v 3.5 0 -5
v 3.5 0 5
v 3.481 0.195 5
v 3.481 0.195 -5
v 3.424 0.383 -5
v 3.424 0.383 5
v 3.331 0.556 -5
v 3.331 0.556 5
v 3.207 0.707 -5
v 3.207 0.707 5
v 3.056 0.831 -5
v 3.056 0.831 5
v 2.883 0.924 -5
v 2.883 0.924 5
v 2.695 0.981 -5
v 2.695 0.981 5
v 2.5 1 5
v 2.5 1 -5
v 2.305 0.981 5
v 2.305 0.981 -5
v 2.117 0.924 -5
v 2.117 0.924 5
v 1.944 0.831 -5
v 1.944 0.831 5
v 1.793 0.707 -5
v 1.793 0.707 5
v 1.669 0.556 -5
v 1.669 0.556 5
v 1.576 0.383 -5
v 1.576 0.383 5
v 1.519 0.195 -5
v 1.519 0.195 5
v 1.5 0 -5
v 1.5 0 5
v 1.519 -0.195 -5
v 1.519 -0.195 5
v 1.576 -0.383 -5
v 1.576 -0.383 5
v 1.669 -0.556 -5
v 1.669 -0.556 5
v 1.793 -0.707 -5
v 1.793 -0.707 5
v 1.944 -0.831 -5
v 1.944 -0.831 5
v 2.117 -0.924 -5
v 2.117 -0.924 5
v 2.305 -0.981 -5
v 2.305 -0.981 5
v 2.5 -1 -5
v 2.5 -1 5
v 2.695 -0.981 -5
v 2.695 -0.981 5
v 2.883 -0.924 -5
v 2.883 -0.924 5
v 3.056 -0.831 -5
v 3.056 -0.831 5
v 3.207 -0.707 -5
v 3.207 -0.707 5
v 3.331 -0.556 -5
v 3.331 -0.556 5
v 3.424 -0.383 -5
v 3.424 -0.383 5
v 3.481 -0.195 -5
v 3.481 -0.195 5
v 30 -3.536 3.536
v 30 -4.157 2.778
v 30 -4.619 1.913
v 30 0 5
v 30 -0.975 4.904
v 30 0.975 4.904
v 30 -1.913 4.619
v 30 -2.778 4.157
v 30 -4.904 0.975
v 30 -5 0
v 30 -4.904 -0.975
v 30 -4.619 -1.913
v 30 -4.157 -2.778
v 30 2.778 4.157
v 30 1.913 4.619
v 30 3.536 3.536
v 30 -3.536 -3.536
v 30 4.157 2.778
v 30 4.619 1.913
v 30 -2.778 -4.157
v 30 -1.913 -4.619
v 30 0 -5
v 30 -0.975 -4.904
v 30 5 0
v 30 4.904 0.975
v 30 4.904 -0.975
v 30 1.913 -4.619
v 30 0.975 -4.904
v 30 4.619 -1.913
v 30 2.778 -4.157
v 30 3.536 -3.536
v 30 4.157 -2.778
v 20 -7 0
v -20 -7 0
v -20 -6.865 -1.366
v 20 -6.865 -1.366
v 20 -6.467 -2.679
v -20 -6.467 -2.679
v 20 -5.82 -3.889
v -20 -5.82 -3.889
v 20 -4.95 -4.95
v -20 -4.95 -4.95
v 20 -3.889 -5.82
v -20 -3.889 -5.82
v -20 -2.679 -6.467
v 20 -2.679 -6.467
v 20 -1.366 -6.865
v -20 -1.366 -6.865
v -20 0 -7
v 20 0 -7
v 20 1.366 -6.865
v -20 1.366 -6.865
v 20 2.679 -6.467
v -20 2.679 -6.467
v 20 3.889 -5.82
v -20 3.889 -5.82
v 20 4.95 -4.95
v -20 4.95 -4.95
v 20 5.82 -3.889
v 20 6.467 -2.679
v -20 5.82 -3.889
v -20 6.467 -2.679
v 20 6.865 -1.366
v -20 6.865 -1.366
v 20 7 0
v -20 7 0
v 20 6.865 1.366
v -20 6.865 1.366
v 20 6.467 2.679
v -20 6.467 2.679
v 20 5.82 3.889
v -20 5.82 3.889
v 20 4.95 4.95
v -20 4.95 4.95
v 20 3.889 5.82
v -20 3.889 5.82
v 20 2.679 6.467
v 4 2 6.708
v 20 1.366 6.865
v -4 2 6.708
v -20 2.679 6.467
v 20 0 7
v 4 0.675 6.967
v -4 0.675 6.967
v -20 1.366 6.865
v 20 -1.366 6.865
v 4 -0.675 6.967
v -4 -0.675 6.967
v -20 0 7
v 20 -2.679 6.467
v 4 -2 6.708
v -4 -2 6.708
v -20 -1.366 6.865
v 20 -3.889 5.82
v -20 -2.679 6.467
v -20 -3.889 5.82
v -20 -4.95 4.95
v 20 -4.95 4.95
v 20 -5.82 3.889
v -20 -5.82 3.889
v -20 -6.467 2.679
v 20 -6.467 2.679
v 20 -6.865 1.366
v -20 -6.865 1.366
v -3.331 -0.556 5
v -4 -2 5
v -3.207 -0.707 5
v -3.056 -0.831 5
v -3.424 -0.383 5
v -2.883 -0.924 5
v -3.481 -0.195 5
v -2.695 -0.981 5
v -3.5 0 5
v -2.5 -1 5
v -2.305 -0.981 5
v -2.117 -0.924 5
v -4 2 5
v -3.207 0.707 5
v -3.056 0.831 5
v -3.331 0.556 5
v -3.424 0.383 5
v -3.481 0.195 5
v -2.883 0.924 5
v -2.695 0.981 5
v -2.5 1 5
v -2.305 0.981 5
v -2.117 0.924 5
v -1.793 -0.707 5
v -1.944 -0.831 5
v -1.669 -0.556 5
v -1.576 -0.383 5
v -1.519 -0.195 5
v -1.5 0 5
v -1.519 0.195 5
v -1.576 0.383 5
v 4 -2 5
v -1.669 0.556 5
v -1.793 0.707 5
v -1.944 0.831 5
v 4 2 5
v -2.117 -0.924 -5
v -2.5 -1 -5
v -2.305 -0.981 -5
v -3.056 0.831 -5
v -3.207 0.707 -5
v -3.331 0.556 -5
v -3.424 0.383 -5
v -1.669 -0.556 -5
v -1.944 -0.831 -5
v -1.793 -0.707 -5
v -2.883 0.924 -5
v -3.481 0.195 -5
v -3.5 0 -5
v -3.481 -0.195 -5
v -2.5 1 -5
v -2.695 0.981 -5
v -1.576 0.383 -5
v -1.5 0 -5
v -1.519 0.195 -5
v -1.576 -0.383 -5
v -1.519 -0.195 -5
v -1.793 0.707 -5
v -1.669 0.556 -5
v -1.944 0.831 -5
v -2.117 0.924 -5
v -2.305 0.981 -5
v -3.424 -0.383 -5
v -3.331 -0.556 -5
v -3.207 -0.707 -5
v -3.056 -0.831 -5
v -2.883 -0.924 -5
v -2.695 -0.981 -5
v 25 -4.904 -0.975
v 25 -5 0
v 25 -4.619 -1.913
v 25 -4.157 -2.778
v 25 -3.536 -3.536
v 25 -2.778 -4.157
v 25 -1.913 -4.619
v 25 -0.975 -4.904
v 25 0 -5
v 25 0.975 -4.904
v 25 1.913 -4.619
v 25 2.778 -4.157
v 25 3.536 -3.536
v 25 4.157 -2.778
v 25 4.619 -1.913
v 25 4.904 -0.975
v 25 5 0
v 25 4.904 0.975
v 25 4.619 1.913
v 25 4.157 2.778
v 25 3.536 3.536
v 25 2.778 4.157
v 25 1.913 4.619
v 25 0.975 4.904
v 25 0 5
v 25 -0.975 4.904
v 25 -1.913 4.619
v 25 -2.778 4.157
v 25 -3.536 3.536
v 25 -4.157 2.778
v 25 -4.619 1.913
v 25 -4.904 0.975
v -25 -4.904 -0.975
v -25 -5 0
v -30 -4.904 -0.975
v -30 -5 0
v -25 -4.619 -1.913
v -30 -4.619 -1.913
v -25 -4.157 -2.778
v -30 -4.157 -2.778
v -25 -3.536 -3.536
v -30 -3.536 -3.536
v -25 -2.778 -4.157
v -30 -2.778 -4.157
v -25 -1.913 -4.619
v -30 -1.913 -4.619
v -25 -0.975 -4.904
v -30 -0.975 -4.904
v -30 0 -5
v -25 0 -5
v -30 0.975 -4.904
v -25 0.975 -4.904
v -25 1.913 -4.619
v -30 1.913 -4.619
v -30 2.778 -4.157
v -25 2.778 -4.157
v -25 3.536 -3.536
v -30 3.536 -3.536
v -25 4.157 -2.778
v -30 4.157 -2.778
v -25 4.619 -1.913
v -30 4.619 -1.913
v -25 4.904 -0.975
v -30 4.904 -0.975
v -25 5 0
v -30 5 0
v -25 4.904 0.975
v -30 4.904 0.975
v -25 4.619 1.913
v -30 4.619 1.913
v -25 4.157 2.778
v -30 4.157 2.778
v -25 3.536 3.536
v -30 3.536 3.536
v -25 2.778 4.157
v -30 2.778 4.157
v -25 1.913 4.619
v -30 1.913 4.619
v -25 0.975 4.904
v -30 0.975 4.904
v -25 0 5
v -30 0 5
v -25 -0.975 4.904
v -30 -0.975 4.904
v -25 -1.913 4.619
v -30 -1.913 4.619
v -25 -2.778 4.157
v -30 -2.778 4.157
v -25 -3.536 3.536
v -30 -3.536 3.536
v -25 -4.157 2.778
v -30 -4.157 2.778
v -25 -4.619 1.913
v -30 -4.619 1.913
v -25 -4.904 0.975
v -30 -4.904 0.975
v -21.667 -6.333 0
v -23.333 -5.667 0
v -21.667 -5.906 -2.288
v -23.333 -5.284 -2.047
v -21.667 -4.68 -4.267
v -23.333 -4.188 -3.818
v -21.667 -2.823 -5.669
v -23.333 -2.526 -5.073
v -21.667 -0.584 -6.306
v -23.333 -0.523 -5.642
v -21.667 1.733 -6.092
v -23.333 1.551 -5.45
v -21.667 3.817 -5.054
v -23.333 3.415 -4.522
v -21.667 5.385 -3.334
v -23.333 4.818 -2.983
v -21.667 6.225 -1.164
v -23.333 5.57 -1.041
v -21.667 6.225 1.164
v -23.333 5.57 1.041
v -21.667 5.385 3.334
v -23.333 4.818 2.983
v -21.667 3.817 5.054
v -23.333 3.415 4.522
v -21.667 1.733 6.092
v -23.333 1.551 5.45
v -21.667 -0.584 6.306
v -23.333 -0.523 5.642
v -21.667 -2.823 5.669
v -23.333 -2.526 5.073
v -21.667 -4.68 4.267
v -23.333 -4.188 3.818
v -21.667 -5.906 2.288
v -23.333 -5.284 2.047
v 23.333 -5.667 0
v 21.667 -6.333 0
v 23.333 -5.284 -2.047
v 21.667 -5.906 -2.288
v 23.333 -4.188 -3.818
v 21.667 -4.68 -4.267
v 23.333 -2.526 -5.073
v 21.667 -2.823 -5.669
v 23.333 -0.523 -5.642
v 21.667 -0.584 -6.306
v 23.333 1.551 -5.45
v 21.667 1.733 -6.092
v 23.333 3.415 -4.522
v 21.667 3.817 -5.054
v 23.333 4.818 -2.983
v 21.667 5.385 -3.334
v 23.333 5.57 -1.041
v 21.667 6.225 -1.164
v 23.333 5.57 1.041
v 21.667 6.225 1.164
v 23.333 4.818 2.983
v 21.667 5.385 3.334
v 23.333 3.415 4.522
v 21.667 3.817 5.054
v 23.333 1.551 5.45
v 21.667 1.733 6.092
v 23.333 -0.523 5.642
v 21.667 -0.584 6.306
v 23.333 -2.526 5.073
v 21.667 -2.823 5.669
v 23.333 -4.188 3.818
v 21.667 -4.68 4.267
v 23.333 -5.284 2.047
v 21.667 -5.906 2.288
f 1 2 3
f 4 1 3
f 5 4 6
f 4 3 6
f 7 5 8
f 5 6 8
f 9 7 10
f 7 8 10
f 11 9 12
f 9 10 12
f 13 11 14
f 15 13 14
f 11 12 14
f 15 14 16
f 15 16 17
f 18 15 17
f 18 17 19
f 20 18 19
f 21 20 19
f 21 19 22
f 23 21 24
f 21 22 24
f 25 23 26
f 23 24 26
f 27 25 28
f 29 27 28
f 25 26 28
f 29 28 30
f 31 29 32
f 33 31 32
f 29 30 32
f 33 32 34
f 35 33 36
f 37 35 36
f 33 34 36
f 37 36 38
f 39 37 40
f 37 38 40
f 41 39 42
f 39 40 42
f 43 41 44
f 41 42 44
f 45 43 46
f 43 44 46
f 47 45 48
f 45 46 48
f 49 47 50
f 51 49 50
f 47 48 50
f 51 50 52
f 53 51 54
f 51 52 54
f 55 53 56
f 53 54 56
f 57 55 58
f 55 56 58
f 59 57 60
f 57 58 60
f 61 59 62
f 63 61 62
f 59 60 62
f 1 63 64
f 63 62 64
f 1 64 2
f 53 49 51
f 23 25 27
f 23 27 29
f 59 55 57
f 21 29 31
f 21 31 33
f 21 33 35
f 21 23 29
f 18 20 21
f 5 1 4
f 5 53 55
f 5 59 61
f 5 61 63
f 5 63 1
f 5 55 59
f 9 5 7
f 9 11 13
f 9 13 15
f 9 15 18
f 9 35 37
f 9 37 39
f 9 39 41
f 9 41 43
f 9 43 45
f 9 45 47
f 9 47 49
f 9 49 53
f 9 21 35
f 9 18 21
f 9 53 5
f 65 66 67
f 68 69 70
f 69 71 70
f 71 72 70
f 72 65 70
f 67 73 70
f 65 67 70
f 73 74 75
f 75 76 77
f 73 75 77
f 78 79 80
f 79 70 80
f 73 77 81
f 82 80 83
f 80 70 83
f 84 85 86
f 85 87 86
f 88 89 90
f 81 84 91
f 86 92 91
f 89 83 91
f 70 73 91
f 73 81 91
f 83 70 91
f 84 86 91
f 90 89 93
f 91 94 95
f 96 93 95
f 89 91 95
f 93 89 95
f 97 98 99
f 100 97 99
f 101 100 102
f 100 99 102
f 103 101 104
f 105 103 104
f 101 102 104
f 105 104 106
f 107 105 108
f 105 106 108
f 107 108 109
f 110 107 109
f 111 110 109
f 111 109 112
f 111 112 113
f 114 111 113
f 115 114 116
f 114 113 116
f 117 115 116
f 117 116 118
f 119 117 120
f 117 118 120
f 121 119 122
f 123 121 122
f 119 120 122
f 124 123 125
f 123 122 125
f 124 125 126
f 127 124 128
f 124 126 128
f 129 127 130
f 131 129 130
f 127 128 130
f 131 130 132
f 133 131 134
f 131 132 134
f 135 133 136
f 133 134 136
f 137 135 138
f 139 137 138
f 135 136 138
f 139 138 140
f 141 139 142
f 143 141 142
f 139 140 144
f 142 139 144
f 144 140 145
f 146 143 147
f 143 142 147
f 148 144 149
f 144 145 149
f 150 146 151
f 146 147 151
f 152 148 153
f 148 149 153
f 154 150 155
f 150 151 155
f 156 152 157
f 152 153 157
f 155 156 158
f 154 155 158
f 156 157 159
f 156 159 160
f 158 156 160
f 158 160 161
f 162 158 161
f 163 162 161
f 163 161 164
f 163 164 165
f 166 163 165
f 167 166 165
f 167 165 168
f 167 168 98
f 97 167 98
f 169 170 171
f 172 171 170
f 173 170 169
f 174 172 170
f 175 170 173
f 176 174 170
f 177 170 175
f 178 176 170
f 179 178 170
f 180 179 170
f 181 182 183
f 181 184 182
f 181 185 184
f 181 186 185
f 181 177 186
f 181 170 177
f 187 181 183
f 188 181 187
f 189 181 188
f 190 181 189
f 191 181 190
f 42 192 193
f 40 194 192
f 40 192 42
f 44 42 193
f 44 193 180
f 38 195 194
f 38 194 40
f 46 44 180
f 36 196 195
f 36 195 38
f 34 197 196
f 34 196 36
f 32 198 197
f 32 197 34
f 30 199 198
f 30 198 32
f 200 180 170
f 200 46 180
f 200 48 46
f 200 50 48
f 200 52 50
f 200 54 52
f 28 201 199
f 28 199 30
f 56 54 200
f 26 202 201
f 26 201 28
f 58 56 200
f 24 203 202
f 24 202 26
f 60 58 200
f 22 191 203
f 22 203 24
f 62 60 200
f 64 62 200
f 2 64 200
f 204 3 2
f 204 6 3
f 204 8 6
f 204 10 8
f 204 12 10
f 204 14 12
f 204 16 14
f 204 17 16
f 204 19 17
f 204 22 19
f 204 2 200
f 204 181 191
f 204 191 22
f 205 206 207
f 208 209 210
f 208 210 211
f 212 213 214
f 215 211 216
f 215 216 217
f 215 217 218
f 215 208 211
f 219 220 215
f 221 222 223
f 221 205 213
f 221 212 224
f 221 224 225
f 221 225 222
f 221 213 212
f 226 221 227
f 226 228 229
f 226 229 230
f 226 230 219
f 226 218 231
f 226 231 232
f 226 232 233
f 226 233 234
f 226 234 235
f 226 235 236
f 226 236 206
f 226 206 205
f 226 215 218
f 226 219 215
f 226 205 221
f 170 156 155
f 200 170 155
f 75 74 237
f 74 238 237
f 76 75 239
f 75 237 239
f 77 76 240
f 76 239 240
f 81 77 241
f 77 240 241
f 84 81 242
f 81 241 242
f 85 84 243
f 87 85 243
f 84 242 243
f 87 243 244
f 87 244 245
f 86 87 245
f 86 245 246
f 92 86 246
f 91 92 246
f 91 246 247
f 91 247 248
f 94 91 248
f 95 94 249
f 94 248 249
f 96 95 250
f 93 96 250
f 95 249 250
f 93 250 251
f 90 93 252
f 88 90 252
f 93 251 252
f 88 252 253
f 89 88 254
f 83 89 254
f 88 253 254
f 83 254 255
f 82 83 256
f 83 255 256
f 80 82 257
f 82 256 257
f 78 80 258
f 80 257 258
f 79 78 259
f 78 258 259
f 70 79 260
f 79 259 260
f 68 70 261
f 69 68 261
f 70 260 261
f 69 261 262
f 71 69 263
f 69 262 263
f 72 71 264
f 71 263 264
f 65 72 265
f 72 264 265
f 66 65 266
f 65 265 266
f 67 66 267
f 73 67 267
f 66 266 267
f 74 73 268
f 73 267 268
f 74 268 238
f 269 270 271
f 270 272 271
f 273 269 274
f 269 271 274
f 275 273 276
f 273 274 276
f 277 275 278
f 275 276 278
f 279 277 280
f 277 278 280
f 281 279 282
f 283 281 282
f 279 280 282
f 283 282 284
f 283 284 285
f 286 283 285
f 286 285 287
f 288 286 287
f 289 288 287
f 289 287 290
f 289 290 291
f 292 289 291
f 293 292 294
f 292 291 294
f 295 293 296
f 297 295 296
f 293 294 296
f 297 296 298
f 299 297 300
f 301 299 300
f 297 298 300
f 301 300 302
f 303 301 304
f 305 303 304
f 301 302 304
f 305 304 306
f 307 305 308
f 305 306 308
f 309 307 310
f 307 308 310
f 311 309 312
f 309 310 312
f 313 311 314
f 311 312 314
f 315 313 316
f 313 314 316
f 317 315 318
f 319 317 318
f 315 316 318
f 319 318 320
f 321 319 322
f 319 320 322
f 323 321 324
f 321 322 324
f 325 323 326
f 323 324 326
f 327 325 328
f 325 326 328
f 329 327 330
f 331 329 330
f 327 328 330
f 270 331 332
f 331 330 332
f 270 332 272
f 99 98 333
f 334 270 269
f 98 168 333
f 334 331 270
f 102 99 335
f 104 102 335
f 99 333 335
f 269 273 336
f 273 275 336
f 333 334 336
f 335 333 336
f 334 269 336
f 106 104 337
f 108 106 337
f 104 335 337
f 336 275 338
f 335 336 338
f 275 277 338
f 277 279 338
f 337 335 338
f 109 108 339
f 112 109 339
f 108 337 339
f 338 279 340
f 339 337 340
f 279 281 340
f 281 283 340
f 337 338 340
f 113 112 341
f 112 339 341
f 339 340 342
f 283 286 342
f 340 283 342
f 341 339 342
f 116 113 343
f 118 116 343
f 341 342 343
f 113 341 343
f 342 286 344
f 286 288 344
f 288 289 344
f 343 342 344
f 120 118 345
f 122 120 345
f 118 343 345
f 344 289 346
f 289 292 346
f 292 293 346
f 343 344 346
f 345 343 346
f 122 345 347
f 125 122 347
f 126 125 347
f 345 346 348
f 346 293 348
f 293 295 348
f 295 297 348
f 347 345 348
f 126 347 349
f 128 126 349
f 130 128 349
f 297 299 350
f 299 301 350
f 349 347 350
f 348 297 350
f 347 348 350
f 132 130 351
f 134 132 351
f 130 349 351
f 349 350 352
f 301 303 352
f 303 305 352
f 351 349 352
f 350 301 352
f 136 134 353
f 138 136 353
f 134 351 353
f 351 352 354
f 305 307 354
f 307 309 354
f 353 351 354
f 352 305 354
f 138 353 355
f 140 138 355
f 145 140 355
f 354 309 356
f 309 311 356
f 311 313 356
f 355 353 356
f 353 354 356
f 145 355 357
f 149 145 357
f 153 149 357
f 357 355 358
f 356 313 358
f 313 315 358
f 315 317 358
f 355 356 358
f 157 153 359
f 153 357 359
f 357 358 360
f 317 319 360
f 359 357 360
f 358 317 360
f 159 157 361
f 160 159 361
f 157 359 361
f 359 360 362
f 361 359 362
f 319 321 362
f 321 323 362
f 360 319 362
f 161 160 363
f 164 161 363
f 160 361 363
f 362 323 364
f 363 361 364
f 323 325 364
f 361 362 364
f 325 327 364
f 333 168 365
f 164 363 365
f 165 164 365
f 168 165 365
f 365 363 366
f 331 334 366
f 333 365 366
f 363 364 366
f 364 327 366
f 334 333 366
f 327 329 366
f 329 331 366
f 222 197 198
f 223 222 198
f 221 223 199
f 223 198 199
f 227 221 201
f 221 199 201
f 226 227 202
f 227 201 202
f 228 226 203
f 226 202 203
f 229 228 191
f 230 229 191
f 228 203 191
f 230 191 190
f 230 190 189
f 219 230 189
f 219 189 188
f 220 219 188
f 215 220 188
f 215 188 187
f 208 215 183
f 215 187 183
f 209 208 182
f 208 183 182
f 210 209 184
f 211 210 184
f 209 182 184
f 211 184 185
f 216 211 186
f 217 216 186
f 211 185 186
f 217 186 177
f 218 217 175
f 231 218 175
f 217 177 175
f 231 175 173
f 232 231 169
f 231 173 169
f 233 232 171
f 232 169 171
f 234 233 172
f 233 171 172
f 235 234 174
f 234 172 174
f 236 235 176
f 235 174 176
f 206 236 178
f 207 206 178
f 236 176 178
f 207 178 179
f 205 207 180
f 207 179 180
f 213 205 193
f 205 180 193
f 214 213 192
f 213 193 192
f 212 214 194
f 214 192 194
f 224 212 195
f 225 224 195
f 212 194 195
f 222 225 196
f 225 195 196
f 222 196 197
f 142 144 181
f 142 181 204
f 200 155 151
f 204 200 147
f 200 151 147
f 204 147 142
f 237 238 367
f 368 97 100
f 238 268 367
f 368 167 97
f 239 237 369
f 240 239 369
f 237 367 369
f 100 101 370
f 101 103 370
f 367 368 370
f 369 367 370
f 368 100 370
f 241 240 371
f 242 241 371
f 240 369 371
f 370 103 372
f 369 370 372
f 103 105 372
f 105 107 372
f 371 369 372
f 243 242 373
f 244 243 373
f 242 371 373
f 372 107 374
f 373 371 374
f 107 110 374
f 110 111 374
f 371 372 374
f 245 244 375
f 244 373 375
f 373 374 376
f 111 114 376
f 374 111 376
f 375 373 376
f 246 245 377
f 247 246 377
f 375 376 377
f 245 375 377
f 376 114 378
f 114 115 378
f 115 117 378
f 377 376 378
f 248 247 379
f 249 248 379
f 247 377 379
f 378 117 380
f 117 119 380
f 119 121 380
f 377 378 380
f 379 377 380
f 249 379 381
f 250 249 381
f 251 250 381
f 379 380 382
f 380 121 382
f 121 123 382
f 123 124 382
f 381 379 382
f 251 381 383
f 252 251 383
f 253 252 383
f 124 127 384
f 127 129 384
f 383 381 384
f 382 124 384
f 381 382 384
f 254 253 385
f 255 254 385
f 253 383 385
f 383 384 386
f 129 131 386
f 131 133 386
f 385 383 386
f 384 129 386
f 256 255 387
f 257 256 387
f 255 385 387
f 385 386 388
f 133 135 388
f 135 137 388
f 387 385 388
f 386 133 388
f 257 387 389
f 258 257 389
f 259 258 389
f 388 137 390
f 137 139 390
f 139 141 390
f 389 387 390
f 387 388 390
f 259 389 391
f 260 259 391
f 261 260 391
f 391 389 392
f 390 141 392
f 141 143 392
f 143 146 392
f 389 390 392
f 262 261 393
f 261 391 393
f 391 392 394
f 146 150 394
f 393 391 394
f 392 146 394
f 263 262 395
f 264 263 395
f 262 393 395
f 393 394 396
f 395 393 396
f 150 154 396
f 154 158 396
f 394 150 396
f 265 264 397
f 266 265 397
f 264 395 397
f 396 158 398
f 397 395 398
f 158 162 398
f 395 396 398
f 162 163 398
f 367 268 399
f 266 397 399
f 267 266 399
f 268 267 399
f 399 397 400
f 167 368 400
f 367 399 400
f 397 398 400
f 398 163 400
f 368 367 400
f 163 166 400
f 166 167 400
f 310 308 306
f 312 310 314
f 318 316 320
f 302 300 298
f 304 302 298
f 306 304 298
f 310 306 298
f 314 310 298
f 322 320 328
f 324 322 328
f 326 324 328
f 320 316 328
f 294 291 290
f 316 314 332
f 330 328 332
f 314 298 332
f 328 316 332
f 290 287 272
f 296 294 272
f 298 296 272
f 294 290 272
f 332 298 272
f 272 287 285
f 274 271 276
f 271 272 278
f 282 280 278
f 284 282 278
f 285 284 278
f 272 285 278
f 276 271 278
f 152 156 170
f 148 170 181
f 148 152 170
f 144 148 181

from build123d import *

# Parameters (mm, degrees)
ESQUISSE2_W             = 8
ESQUISSE2_H             = 4
ENL_V_MAT_EXTRU_2_DEPTH = 2
ESQUISSE3_R             = 1
ENL_V_MAT_EXTRU_3_DEPTH = 10


with BuildPart() as part:
    # Esquisse1 → Révolution1 (revolve)
    with BuildSketch(Plane.XY, mode=Mode.PRIVATE) as r_volution1_sk:
        Polygon((-30, 0), (30, 0), (30, 5), (25, 5), (20, 7), (-20, 7), (-25, 5), (-30, 5), align=None)
    revolve(r_volution1_sk.sketch.rotate(Axis((-30, 0, 0), (1, 0, 0)), 180), axis=Axis((-30, 0, 0), (1, 0, 0)))

    # Esquisse2 → Enlèv. mat.-Extru.2 (cut)
    with BuildSketch(Plane.XY.offset(7)):
        Rectangle(ESQUISSE2_W, ESQUISSE2_H)
    extrude(amount=-ENL_V_MAT_EXTRU_2_DEPTH, mode=Mode.SUBTRACT)

    # Esquisse3 → Enlèv. mat.-Extru.3 (cut)
    with BuildSketch(Plane.XY.offset(5)):
        with Locations((2.5, 0)):
            Circle(ESQUISSE3_R)
        with Locations((-2.5, 0)):
            Circle(ESQUISSE3_R)
    extrude(amount=-ENL_V_MAT_EXTRU_3_DEPTH, mode=Mode.SUBTRACT)


solid = part.part
